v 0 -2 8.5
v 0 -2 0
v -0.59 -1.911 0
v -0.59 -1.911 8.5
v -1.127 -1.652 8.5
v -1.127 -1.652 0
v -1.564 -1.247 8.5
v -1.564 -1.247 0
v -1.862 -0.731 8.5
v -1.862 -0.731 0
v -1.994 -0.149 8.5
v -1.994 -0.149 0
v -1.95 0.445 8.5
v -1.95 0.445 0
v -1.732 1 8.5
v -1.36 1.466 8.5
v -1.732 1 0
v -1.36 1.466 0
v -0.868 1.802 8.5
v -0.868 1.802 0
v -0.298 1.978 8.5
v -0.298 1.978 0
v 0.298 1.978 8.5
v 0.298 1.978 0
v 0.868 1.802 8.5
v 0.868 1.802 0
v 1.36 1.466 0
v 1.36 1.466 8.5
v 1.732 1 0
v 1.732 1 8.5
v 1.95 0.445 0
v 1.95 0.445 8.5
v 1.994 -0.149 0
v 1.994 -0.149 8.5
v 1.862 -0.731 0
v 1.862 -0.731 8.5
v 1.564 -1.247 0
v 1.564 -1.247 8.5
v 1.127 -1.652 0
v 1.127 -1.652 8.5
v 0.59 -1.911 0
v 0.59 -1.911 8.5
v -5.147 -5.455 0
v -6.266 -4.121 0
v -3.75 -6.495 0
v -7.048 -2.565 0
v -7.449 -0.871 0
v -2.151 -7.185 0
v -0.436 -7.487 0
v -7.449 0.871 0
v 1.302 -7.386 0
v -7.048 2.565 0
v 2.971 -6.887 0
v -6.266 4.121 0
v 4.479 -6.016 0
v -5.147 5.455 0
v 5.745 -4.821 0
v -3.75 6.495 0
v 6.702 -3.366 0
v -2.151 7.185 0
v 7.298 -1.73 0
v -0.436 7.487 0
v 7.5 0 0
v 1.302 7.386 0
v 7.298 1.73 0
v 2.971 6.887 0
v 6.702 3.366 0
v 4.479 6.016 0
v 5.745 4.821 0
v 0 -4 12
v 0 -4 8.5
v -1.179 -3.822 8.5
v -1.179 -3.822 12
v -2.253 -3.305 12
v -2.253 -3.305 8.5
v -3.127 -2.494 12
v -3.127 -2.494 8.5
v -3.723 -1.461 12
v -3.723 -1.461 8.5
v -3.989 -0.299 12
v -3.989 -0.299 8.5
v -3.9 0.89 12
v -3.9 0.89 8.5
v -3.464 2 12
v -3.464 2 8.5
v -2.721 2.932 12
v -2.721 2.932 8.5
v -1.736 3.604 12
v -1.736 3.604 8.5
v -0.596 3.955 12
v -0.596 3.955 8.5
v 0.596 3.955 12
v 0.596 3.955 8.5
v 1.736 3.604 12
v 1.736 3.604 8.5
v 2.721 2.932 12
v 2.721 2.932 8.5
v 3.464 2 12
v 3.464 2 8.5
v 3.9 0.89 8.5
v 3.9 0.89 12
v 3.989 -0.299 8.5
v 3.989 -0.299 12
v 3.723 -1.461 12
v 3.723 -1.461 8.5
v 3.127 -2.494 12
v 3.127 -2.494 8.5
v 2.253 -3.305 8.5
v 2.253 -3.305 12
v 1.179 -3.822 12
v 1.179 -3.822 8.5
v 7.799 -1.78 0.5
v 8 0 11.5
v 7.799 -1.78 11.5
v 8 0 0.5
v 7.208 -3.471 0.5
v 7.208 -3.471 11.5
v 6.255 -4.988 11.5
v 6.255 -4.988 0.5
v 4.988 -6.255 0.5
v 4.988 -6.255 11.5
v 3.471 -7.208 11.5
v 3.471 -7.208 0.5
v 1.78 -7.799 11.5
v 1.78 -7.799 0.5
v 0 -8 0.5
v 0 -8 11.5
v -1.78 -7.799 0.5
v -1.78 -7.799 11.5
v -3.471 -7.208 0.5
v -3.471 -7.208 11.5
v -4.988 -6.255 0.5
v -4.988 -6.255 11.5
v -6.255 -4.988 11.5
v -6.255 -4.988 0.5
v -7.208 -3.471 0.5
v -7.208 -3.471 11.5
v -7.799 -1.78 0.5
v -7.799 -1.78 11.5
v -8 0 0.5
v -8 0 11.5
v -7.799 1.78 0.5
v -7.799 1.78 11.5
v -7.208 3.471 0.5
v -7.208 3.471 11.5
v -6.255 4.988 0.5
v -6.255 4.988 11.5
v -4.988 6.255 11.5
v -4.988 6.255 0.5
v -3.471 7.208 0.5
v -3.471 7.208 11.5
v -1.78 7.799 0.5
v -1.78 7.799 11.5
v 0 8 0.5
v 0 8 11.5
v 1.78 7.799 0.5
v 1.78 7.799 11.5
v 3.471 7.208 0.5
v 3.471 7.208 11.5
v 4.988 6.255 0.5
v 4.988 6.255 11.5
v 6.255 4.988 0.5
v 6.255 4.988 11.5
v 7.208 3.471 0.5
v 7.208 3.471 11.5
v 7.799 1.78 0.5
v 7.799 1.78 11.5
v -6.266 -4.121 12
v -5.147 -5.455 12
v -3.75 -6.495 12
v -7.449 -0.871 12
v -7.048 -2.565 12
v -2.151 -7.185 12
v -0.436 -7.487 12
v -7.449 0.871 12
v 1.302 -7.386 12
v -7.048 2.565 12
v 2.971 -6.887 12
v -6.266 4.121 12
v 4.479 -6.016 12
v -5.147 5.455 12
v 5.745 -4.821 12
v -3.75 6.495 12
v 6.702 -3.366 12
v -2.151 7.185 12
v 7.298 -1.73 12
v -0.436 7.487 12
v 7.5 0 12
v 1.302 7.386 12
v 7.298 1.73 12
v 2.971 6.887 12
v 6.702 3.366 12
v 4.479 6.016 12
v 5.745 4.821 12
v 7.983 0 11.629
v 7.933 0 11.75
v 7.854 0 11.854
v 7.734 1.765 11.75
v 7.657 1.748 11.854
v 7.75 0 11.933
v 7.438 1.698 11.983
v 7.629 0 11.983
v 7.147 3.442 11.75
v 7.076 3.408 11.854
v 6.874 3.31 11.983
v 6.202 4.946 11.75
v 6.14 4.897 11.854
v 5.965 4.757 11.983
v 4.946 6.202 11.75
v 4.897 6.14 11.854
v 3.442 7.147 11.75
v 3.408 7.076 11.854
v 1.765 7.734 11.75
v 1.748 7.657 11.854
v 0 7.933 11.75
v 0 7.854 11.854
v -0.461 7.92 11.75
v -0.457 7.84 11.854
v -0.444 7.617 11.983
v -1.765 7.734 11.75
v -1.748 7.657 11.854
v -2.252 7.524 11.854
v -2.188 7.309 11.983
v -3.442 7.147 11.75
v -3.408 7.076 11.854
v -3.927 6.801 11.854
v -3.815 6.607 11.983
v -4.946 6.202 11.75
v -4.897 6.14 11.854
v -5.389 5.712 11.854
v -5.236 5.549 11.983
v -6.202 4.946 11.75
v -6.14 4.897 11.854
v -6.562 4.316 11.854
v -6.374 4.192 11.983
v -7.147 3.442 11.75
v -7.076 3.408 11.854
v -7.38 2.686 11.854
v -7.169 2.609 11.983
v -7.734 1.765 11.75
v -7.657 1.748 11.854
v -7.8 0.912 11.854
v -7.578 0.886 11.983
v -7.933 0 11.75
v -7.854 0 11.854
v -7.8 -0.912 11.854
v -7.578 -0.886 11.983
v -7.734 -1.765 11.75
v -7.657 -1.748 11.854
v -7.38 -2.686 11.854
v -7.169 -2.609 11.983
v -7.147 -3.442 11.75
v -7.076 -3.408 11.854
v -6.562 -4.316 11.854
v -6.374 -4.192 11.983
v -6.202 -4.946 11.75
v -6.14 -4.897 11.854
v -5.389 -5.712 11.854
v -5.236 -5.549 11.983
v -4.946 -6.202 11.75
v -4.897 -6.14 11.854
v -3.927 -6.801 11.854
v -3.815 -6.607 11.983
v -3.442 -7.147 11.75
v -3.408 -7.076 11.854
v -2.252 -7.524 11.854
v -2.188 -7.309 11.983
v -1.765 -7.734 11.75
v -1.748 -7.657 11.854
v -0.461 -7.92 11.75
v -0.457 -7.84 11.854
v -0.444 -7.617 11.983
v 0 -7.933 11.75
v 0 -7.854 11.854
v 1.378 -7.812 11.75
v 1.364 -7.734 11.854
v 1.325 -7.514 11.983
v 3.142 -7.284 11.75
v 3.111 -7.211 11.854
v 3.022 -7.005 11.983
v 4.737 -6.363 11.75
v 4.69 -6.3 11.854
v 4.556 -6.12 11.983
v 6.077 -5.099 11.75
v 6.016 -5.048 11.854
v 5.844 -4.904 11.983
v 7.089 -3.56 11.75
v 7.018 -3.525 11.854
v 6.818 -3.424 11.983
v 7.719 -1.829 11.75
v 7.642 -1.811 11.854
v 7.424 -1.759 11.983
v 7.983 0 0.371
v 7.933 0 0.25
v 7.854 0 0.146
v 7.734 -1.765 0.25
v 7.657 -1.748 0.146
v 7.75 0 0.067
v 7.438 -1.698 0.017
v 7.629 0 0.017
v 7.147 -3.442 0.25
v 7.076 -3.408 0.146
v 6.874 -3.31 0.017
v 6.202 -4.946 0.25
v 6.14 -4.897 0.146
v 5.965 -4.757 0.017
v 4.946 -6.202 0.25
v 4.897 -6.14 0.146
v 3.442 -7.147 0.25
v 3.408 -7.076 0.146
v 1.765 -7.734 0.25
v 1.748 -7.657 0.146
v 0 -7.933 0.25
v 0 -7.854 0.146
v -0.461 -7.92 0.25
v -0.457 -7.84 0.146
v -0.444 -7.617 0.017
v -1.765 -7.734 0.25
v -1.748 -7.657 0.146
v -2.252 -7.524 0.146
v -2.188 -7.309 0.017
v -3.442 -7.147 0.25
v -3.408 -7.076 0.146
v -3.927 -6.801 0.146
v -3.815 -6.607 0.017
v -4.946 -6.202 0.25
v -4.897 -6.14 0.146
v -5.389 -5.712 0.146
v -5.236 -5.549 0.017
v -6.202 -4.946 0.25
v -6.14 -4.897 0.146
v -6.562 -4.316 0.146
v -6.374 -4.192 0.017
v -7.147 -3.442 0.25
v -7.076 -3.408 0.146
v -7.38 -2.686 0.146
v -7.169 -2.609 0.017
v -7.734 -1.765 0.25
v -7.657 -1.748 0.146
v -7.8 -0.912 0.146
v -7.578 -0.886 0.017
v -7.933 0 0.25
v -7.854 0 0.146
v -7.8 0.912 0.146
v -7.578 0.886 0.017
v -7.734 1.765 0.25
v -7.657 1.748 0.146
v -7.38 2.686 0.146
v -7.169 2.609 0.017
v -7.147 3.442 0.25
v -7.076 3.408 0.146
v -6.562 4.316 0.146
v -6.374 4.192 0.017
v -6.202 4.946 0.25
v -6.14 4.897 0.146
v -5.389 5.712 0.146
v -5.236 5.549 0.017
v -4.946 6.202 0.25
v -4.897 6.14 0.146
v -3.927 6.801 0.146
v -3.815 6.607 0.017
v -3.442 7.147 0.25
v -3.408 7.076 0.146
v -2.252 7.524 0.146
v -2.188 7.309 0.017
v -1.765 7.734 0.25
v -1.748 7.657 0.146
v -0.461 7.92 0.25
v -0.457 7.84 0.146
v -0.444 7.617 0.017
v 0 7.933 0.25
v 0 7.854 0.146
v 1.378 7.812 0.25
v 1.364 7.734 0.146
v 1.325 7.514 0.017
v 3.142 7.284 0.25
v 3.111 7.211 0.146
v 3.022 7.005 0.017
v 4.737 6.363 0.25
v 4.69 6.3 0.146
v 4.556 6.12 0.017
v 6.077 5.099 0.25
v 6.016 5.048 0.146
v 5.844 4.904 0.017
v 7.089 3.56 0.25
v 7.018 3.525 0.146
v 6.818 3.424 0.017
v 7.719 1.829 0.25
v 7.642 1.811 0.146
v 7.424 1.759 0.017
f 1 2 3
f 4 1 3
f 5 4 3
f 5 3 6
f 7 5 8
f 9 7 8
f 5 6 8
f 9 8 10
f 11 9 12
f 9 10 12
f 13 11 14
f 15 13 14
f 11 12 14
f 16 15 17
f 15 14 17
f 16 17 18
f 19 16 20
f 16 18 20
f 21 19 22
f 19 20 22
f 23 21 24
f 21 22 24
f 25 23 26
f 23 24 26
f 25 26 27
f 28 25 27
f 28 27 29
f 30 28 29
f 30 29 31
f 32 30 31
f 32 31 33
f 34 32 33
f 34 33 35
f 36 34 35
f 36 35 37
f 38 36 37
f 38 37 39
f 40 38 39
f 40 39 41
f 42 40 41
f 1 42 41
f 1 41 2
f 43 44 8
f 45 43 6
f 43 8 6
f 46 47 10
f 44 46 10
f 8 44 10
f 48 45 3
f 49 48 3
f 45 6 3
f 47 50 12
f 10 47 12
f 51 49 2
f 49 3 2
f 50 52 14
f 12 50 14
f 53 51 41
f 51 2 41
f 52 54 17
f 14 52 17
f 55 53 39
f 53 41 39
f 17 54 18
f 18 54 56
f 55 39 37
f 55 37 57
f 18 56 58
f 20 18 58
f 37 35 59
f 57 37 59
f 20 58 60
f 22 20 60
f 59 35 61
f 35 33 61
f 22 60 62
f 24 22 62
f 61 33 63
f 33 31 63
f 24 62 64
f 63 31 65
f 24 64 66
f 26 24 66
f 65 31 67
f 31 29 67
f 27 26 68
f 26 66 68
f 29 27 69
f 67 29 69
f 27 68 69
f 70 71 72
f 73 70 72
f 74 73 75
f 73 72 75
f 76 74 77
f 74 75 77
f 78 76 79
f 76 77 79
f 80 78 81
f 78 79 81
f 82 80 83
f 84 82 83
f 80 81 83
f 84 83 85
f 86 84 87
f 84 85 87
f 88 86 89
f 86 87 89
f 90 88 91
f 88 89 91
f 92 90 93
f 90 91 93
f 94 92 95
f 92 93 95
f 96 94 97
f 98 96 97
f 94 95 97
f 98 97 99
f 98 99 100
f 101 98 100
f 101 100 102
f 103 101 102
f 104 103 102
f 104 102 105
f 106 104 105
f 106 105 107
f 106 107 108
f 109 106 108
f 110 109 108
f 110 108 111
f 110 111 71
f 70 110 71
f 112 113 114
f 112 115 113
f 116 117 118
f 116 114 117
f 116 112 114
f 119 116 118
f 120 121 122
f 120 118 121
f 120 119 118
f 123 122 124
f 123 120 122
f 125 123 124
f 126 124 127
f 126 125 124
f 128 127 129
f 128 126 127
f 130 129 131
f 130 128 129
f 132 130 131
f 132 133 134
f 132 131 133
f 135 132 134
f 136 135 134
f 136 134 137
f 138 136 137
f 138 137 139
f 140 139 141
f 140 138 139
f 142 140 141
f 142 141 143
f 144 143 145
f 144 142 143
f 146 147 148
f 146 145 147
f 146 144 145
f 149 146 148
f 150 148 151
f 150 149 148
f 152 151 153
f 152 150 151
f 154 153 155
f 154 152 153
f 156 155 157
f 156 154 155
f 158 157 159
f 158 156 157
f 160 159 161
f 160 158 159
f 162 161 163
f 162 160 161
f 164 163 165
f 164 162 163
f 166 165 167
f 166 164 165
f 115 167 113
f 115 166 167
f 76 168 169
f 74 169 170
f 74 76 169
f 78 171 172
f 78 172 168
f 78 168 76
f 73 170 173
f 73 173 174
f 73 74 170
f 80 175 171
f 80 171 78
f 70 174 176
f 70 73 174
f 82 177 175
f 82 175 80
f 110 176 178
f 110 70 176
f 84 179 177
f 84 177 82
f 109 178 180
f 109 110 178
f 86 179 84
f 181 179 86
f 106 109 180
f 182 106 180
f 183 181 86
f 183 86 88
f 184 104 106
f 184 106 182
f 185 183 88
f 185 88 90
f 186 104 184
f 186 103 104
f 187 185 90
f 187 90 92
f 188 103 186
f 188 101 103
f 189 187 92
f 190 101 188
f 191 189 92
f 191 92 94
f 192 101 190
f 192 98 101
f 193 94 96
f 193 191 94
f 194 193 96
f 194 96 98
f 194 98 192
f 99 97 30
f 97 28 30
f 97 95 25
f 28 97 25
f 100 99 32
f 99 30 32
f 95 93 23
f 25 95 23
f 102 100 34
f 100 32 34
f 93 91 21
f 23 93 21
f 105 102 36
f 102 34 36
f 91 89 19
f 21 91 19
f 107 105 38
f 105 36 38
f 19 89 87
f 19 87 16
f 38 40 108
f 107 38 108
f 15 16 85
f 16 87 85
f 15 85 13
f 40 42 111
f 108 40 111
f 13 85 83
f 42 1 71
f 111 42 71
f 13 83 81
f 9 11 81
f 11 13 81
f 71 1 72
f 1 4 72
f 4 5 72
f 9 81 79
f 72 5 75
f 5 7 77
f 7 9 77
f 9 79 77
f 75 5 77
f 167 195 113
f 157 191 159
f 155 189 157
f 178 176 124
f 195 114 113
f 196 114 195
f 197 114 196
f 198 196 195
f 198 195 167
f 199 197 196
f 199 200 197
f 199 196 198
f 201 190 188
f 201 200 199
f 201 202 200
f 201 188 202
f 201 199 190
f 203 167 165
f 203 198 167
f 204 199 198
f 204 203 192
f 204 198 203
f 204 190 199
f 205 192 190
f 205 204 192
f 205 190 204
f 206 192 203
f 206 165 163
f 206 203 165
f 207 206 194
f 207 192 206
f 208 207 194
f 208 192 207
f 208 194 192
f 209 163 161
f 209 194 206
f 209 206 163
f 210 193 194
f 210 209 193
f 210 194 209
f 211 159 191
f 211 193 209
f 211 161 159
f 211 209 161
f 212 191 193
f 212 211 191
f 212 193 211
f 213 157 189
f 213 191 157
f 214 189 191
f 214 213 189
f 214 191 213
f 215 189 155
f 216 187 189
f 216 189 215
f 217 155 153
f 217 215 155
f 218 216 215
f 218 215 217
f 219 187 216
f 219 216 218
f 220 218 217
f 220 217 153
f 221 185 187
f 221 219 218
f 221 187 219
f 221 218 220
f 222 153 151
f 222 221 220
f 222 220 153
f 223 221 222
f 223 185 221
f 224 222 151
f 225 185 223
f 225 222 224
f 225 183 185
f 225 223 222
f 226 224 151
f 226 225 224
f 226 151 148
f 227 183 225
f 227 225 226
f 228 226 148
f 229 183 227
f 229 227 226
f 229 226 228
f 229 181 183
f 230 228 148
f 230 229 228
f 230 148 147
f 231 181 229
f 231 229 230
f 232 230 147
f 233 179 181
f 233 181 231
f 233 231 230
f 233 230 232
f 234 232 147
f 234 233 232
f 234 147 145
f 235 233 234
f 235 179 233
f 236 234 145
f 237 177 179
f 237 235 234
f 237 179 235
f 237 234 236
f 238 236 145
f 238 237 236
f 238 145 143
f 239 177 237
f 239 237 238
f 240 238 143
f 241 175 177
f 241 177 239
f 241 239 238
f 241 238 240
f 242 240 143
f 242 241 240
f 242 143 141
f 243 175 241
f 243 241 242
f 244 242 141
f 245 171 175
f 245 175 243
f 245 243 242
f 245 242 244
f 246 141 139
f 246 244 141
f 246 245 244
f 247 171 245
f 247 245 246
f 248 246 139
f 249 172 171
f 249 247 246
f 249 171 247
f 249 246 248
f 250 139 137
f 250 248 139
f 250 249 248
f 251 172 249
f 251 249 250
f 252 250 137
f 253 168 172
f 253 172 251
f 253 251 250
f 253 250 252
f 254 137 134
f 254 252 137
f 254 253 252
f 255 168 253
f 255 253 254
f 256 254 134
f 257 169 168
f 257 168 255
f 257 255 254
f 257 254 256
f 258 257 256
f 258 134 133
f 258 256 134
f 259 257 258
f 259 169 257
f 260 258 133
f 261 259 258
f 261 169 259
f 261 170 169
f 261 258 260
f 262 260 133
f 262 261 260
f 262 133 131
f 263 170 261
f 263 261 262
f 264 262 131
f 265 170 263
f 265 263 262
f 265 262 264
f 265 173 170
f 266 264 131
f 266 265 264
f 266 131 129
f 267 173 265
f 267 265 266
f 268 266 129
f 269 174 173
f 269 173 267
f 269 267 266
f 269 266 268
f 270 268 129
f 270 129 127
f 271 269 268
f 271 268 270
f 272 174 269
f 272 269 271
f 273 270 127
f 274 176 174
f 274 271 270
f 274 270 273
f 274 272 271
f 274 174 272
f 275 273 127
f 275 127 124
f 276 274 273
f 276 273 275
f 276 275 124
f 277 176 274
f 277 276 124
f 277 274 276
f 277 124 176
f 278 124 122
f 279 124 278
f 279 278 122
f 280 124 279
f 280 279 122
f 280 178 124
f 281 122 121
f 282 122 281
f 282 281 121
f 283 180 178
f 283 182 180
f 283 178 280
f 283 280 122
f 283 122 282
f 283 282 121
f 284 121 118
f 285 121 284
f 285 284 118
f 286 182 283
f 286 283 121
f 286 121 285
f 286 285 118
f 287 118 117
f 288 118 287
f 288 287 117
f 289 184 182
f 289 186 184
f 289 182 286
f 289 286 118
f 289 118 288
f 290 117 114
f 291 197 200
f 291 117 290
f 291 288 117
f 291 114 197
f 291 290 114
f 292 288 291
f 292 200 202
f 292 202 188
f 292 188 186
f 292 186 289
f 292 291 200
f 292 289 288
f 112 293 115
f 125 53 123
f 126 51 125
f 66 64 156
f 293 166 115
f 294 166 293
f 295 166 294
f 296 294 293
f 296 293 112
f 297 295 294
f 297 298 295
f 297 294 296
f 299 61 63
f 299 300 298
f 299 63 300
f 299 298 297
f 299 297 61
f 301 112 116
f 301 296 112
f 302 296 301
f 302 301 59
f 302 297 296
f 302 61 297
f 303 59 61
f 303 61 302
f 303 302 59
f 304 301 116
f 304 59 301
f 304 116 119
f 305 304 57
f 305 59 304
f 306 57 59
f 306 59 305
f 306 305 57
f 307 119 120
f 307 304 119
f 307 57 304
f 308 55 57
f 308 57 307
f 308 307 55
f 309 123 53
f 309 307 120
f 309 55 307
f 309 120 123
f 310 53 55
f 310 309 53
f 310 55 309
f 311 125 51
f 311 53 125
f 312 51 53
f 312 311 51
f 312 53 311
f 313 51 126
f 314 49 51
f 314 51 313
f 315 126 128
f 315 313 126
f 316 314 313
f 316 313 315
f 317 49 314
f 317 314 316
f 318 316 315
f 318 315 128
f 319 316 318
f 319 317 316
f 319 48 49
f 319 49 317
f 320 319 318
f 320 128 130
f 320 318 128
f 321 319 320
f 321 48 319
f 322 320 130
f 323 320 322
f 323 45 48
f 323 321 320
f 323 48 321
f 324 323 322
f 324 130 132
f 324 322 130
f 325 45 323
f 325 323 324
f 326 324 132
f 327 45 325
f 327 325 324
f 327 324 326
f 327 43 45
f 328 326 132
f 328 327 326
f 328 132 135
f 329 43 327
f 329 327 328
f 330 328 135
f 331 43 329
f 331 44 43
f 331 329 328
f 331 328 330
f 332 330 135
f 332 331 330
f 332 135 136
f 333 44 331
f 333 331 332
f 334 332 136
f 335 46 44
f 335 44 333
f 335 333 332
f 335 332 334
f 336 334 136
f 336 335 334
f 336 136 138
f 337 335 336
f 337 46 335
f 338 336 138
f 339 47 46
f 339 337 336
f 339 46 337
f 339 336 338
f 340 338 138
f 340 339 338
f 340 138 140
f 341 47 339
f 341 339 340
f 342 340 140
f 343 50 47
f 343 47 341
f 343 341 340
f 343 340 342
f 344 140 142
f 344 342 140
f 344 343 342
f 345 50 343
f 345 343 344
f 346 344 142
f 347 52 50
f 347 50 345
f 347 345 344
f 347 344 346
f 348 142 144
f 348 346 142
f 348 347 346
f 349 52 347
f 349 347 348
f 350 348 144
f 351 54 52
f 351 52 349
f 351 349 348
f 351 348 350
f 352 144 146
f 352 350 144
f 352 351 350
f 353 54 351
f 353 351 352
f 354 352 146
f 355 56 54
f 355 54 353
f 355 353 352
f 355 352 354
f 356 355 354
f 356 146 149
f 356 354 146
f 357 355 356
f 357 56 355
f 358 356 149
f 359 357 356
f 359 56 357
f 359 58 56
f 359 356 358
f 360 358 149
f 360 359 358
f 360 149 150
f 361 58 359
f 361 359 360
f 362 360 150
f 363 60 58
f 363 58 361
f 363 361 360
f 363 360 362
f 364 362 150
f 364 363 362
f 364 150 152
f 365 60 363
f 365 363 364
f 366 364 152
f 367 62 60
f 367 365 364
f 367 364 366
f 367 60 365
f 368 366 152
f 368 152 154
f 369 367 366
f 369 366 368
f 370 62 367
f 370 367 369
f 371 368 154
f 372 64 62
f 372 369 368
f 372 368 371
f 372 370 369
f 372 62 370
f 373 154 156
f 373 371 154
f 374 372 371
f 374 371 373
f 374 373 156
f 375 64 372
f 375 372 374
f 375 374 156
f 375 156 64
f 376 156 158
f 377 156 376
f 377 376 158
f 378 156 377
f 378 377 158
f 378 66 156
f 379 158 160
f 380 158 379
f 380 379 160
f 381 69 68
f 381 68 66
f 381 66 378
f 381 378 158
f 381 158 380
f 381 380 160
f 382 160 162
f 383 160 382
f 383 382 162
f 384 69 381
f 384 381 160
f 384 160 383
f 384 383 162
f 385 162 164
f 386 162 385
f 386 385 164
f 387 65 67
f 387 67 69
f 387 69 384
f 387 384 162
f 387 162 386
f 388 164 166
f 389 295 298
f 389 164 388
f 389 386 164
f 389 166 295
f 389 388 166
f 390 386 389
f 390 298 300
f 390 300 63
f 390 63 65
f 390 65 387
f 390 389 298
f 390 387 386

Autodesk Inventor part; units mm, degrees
ref_plane "YZ Plane" through (0, 0, 0) normal (1, 0, 0) x (0, 1, 0)
ref_plane "XZ Plane" through (0, 0, 0) normal (0, 1, 0) x (-1, 0, 0)
ref_plane "XY Plane" through (0, 0, 0) normal (0, 0, 1) x (1, 0, 0)
sketch "Sketch1" plane through (0, 0, 0) normal (0, 0, 1) x (1, 0, 0)
  circle A0 centre (0, 0) radius 8
  dimension "d0" = 16
extrude "Extrusion1" add sketch "Sketch1" along normal blind 12
sketch "Sketch2" plane through (0, 0, 12) normal (0, 0, 1) x (1, 0, 0)
  circle A0 centre (0, 0) radius 8 projected
hole "Hole1" at (0, 0, 12) direction (0, 0, -1) diameter 4 end through all counterbore diameter 8 counterbore depth 3.5
fillet "Fillet1" radius 0.5 2 edges at (-8, 0, 12) (-8, 0, 0)
properties part number "Silicone Bed Spacers" material "Rubber, Silicone"
